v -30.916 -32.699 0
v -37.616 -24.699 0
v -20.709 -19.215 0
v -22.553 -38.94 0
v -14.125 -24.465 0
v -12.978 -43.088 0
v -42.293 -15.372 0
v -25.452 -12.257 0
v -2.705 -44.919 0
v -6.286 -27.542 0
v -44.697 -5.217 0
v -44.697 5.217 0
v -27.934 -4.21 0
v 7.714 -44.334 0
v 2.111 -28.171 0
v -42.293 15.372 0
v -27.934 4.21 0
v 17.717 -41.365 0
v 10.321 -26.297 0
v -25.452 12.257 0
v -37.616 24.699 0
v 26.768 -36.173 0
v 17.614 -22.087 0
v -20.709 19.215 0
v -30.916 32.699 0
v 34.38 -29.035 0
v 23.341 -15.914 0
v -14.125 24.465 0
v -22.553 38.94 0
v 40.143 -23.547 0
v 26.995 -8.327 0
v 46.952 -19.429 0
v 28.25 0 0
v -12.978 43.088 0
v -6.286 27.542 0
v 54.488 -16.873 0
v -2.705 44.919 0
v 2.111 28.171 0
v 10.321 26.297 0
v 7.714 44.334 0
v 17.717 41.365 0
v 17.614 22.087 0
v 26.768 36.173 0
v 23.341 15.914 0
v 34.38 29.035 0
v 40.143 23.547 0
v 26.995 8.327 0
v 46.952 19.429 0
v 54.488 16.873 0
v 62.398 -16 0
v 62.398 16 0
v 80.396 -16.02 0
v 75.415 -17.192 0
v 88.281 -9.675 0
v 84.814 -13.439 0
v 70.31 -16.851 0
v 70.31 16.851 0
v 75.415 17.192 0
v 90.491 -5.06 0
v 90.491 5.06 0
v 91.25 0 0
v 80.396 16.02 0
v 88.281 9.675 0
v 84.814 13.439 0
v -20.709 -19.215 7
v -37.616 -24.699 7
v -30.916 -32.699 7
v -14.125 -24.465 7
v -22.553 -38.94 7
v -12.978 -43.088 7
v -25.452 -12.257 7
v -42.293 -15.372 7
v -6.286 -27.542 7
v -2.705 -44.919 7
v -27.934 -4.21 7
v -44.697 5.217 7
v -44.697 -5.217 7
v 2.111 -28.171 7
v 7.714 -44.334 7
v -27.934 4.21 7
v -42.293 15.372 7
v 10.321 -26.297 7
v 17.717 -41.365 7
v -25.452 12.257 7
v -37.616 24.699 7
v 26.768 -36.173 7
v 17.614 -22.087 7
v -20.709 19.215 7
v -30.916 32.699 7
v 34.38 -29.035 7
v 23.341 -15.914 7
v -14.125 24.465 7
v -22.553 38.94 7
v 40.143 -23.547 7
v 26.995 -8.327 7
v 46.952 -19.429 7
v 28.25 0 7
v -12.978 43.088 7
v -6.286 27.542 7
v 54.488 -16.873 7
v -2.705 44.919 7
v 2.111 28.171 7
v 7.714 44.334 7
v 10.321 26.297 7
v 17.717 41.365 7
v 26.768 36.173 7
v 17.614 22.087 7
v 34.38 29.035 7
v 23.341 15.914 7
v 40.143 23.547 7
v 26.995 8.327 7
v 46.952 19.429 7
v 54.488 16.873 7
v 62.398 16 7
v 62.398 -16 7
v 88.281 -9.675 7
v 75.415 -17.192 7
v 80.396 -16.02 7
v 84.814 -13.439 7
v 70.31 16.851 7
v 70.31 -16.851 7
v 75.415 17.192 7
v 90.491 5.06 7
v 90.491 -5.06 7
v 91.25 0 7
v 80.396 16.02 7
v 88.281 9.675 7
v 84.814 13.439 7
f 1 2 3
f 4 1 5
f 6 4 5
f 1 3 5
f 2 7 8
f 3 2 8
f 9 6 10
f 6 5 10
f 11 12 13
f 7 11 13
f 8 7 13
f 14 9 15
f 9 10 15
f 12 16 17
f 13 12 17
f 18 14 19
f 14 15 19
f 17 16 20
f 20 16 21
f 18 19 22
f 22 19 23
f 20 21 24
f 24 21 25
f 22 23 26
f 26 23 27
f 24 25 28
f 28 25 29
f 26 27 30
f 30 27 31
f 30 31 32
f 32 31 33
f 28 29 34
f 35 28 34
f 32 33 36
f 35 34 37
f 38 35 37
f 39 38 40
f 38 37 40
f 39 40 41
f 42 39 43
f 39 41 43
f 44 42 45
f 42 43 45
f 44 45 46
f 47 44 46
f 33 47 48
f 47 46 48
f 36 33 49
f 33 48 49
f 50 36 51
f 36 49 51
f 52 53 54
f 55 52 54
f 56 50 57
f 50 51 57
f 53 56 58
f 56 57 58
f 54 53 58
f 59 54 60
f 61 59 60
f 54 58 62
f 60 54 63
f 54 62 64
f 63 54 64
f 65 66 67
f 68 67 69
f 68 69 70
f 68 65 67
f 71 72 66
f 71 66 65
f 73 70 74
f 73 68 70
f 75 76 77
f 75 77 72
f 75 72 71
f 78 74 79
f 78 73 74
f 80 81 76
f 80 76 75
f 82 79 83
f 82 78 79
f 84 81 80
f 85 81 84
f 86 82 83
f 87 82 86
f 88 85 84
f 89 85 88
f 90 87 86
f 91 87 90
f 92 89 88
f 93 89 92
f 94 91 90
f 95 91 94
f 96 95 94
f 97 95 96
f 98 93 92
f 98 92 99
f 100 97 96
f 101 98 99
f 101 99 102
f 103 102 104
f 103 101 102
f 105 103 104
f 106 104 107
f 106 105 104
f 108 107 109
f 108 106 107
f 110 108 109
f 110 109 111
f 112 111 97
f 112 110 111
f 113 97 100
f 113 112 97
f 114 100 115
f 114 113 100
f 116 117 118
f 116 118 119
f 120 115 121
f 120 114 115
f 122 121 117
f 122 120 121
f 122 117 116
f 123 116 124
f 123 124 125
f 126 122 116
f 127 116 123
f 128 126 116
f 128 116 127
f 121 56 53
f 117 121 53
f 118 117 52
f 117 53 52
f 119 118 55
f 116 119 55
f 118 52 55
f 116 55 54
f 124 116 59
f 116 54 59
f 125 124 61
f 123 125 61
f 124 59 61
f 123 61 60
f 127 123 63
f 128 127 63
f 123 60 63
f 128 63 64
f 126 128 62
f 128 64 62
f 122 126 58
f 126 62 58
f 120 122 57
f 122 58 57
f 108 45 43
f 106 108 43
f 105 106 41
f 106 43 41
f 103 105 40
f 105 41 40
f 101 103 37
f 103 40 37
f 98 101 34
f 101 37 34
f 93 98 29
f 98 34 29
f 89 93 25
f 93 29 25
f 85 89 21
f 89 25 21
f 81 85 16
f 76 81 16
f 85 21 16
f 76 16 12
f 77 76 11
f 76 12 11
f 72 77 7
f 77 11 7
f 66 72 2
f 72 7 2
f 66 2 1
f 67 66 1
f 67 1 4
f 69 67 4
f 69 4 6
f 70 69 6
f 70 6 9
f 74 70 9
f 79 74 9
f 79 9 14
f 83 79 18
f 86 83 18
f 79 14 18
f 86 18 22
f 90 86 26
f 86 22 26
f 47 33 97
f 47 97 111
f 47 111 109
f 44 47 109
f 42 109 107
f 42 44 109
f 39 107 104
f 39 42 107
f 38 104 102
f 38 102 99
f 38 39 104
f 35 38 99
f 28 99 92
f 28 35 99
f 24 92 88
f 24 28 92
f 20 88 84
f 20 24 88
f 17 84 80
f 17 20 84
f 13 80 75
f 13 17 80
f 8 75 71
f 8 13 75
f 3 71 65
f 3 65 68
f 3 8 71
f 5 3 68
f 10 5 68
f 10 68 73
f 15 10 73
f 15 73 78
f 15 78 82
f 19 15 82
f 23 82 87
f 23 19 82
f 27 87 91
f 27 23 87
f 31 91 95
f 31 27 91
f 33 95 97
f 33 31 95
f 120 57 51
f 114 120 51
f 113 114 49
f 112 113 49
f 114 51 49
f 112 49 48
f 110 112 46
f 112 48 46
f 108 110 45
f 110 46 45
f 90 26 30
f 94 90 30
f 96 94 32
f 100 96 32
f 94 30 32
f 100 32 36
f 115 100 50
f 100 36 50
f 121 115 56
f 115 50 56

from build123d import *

# Parameters (mm, degrees)
SKETCH1_R          = 28.25
BASE_EXTRUDE_DEPTH = 7


with BuildPart() as part:
    # Sketch1 → Base-Extrude (new body)
    with BuildSketch(Plane.XY):
        with BuildLine():
            ThreePointArc((34.37992312, 29.034821961), (-45, 0), (34.37992312, -29.034821961))
            ThreePointArc((34.37992312, -29.034821961), (50.650379443, -17.946188292), (70.309608401, -16.850623426))
            ThreePointArc((70.309608401, -16.850623426), (91.25, 0), (70.309608401, 16.850623426))
            ThreePointArc((70.309608401, 16.850623426), (50.650379443, 17.946188292), (34.37992312, 29.034821961))
        make_face()
        Circle(SKETCH1_R, mode=Mode.SUBTRACT)
    extrude(amount=BASE_EXTRUDE_DEPTH)


solid = part.part
